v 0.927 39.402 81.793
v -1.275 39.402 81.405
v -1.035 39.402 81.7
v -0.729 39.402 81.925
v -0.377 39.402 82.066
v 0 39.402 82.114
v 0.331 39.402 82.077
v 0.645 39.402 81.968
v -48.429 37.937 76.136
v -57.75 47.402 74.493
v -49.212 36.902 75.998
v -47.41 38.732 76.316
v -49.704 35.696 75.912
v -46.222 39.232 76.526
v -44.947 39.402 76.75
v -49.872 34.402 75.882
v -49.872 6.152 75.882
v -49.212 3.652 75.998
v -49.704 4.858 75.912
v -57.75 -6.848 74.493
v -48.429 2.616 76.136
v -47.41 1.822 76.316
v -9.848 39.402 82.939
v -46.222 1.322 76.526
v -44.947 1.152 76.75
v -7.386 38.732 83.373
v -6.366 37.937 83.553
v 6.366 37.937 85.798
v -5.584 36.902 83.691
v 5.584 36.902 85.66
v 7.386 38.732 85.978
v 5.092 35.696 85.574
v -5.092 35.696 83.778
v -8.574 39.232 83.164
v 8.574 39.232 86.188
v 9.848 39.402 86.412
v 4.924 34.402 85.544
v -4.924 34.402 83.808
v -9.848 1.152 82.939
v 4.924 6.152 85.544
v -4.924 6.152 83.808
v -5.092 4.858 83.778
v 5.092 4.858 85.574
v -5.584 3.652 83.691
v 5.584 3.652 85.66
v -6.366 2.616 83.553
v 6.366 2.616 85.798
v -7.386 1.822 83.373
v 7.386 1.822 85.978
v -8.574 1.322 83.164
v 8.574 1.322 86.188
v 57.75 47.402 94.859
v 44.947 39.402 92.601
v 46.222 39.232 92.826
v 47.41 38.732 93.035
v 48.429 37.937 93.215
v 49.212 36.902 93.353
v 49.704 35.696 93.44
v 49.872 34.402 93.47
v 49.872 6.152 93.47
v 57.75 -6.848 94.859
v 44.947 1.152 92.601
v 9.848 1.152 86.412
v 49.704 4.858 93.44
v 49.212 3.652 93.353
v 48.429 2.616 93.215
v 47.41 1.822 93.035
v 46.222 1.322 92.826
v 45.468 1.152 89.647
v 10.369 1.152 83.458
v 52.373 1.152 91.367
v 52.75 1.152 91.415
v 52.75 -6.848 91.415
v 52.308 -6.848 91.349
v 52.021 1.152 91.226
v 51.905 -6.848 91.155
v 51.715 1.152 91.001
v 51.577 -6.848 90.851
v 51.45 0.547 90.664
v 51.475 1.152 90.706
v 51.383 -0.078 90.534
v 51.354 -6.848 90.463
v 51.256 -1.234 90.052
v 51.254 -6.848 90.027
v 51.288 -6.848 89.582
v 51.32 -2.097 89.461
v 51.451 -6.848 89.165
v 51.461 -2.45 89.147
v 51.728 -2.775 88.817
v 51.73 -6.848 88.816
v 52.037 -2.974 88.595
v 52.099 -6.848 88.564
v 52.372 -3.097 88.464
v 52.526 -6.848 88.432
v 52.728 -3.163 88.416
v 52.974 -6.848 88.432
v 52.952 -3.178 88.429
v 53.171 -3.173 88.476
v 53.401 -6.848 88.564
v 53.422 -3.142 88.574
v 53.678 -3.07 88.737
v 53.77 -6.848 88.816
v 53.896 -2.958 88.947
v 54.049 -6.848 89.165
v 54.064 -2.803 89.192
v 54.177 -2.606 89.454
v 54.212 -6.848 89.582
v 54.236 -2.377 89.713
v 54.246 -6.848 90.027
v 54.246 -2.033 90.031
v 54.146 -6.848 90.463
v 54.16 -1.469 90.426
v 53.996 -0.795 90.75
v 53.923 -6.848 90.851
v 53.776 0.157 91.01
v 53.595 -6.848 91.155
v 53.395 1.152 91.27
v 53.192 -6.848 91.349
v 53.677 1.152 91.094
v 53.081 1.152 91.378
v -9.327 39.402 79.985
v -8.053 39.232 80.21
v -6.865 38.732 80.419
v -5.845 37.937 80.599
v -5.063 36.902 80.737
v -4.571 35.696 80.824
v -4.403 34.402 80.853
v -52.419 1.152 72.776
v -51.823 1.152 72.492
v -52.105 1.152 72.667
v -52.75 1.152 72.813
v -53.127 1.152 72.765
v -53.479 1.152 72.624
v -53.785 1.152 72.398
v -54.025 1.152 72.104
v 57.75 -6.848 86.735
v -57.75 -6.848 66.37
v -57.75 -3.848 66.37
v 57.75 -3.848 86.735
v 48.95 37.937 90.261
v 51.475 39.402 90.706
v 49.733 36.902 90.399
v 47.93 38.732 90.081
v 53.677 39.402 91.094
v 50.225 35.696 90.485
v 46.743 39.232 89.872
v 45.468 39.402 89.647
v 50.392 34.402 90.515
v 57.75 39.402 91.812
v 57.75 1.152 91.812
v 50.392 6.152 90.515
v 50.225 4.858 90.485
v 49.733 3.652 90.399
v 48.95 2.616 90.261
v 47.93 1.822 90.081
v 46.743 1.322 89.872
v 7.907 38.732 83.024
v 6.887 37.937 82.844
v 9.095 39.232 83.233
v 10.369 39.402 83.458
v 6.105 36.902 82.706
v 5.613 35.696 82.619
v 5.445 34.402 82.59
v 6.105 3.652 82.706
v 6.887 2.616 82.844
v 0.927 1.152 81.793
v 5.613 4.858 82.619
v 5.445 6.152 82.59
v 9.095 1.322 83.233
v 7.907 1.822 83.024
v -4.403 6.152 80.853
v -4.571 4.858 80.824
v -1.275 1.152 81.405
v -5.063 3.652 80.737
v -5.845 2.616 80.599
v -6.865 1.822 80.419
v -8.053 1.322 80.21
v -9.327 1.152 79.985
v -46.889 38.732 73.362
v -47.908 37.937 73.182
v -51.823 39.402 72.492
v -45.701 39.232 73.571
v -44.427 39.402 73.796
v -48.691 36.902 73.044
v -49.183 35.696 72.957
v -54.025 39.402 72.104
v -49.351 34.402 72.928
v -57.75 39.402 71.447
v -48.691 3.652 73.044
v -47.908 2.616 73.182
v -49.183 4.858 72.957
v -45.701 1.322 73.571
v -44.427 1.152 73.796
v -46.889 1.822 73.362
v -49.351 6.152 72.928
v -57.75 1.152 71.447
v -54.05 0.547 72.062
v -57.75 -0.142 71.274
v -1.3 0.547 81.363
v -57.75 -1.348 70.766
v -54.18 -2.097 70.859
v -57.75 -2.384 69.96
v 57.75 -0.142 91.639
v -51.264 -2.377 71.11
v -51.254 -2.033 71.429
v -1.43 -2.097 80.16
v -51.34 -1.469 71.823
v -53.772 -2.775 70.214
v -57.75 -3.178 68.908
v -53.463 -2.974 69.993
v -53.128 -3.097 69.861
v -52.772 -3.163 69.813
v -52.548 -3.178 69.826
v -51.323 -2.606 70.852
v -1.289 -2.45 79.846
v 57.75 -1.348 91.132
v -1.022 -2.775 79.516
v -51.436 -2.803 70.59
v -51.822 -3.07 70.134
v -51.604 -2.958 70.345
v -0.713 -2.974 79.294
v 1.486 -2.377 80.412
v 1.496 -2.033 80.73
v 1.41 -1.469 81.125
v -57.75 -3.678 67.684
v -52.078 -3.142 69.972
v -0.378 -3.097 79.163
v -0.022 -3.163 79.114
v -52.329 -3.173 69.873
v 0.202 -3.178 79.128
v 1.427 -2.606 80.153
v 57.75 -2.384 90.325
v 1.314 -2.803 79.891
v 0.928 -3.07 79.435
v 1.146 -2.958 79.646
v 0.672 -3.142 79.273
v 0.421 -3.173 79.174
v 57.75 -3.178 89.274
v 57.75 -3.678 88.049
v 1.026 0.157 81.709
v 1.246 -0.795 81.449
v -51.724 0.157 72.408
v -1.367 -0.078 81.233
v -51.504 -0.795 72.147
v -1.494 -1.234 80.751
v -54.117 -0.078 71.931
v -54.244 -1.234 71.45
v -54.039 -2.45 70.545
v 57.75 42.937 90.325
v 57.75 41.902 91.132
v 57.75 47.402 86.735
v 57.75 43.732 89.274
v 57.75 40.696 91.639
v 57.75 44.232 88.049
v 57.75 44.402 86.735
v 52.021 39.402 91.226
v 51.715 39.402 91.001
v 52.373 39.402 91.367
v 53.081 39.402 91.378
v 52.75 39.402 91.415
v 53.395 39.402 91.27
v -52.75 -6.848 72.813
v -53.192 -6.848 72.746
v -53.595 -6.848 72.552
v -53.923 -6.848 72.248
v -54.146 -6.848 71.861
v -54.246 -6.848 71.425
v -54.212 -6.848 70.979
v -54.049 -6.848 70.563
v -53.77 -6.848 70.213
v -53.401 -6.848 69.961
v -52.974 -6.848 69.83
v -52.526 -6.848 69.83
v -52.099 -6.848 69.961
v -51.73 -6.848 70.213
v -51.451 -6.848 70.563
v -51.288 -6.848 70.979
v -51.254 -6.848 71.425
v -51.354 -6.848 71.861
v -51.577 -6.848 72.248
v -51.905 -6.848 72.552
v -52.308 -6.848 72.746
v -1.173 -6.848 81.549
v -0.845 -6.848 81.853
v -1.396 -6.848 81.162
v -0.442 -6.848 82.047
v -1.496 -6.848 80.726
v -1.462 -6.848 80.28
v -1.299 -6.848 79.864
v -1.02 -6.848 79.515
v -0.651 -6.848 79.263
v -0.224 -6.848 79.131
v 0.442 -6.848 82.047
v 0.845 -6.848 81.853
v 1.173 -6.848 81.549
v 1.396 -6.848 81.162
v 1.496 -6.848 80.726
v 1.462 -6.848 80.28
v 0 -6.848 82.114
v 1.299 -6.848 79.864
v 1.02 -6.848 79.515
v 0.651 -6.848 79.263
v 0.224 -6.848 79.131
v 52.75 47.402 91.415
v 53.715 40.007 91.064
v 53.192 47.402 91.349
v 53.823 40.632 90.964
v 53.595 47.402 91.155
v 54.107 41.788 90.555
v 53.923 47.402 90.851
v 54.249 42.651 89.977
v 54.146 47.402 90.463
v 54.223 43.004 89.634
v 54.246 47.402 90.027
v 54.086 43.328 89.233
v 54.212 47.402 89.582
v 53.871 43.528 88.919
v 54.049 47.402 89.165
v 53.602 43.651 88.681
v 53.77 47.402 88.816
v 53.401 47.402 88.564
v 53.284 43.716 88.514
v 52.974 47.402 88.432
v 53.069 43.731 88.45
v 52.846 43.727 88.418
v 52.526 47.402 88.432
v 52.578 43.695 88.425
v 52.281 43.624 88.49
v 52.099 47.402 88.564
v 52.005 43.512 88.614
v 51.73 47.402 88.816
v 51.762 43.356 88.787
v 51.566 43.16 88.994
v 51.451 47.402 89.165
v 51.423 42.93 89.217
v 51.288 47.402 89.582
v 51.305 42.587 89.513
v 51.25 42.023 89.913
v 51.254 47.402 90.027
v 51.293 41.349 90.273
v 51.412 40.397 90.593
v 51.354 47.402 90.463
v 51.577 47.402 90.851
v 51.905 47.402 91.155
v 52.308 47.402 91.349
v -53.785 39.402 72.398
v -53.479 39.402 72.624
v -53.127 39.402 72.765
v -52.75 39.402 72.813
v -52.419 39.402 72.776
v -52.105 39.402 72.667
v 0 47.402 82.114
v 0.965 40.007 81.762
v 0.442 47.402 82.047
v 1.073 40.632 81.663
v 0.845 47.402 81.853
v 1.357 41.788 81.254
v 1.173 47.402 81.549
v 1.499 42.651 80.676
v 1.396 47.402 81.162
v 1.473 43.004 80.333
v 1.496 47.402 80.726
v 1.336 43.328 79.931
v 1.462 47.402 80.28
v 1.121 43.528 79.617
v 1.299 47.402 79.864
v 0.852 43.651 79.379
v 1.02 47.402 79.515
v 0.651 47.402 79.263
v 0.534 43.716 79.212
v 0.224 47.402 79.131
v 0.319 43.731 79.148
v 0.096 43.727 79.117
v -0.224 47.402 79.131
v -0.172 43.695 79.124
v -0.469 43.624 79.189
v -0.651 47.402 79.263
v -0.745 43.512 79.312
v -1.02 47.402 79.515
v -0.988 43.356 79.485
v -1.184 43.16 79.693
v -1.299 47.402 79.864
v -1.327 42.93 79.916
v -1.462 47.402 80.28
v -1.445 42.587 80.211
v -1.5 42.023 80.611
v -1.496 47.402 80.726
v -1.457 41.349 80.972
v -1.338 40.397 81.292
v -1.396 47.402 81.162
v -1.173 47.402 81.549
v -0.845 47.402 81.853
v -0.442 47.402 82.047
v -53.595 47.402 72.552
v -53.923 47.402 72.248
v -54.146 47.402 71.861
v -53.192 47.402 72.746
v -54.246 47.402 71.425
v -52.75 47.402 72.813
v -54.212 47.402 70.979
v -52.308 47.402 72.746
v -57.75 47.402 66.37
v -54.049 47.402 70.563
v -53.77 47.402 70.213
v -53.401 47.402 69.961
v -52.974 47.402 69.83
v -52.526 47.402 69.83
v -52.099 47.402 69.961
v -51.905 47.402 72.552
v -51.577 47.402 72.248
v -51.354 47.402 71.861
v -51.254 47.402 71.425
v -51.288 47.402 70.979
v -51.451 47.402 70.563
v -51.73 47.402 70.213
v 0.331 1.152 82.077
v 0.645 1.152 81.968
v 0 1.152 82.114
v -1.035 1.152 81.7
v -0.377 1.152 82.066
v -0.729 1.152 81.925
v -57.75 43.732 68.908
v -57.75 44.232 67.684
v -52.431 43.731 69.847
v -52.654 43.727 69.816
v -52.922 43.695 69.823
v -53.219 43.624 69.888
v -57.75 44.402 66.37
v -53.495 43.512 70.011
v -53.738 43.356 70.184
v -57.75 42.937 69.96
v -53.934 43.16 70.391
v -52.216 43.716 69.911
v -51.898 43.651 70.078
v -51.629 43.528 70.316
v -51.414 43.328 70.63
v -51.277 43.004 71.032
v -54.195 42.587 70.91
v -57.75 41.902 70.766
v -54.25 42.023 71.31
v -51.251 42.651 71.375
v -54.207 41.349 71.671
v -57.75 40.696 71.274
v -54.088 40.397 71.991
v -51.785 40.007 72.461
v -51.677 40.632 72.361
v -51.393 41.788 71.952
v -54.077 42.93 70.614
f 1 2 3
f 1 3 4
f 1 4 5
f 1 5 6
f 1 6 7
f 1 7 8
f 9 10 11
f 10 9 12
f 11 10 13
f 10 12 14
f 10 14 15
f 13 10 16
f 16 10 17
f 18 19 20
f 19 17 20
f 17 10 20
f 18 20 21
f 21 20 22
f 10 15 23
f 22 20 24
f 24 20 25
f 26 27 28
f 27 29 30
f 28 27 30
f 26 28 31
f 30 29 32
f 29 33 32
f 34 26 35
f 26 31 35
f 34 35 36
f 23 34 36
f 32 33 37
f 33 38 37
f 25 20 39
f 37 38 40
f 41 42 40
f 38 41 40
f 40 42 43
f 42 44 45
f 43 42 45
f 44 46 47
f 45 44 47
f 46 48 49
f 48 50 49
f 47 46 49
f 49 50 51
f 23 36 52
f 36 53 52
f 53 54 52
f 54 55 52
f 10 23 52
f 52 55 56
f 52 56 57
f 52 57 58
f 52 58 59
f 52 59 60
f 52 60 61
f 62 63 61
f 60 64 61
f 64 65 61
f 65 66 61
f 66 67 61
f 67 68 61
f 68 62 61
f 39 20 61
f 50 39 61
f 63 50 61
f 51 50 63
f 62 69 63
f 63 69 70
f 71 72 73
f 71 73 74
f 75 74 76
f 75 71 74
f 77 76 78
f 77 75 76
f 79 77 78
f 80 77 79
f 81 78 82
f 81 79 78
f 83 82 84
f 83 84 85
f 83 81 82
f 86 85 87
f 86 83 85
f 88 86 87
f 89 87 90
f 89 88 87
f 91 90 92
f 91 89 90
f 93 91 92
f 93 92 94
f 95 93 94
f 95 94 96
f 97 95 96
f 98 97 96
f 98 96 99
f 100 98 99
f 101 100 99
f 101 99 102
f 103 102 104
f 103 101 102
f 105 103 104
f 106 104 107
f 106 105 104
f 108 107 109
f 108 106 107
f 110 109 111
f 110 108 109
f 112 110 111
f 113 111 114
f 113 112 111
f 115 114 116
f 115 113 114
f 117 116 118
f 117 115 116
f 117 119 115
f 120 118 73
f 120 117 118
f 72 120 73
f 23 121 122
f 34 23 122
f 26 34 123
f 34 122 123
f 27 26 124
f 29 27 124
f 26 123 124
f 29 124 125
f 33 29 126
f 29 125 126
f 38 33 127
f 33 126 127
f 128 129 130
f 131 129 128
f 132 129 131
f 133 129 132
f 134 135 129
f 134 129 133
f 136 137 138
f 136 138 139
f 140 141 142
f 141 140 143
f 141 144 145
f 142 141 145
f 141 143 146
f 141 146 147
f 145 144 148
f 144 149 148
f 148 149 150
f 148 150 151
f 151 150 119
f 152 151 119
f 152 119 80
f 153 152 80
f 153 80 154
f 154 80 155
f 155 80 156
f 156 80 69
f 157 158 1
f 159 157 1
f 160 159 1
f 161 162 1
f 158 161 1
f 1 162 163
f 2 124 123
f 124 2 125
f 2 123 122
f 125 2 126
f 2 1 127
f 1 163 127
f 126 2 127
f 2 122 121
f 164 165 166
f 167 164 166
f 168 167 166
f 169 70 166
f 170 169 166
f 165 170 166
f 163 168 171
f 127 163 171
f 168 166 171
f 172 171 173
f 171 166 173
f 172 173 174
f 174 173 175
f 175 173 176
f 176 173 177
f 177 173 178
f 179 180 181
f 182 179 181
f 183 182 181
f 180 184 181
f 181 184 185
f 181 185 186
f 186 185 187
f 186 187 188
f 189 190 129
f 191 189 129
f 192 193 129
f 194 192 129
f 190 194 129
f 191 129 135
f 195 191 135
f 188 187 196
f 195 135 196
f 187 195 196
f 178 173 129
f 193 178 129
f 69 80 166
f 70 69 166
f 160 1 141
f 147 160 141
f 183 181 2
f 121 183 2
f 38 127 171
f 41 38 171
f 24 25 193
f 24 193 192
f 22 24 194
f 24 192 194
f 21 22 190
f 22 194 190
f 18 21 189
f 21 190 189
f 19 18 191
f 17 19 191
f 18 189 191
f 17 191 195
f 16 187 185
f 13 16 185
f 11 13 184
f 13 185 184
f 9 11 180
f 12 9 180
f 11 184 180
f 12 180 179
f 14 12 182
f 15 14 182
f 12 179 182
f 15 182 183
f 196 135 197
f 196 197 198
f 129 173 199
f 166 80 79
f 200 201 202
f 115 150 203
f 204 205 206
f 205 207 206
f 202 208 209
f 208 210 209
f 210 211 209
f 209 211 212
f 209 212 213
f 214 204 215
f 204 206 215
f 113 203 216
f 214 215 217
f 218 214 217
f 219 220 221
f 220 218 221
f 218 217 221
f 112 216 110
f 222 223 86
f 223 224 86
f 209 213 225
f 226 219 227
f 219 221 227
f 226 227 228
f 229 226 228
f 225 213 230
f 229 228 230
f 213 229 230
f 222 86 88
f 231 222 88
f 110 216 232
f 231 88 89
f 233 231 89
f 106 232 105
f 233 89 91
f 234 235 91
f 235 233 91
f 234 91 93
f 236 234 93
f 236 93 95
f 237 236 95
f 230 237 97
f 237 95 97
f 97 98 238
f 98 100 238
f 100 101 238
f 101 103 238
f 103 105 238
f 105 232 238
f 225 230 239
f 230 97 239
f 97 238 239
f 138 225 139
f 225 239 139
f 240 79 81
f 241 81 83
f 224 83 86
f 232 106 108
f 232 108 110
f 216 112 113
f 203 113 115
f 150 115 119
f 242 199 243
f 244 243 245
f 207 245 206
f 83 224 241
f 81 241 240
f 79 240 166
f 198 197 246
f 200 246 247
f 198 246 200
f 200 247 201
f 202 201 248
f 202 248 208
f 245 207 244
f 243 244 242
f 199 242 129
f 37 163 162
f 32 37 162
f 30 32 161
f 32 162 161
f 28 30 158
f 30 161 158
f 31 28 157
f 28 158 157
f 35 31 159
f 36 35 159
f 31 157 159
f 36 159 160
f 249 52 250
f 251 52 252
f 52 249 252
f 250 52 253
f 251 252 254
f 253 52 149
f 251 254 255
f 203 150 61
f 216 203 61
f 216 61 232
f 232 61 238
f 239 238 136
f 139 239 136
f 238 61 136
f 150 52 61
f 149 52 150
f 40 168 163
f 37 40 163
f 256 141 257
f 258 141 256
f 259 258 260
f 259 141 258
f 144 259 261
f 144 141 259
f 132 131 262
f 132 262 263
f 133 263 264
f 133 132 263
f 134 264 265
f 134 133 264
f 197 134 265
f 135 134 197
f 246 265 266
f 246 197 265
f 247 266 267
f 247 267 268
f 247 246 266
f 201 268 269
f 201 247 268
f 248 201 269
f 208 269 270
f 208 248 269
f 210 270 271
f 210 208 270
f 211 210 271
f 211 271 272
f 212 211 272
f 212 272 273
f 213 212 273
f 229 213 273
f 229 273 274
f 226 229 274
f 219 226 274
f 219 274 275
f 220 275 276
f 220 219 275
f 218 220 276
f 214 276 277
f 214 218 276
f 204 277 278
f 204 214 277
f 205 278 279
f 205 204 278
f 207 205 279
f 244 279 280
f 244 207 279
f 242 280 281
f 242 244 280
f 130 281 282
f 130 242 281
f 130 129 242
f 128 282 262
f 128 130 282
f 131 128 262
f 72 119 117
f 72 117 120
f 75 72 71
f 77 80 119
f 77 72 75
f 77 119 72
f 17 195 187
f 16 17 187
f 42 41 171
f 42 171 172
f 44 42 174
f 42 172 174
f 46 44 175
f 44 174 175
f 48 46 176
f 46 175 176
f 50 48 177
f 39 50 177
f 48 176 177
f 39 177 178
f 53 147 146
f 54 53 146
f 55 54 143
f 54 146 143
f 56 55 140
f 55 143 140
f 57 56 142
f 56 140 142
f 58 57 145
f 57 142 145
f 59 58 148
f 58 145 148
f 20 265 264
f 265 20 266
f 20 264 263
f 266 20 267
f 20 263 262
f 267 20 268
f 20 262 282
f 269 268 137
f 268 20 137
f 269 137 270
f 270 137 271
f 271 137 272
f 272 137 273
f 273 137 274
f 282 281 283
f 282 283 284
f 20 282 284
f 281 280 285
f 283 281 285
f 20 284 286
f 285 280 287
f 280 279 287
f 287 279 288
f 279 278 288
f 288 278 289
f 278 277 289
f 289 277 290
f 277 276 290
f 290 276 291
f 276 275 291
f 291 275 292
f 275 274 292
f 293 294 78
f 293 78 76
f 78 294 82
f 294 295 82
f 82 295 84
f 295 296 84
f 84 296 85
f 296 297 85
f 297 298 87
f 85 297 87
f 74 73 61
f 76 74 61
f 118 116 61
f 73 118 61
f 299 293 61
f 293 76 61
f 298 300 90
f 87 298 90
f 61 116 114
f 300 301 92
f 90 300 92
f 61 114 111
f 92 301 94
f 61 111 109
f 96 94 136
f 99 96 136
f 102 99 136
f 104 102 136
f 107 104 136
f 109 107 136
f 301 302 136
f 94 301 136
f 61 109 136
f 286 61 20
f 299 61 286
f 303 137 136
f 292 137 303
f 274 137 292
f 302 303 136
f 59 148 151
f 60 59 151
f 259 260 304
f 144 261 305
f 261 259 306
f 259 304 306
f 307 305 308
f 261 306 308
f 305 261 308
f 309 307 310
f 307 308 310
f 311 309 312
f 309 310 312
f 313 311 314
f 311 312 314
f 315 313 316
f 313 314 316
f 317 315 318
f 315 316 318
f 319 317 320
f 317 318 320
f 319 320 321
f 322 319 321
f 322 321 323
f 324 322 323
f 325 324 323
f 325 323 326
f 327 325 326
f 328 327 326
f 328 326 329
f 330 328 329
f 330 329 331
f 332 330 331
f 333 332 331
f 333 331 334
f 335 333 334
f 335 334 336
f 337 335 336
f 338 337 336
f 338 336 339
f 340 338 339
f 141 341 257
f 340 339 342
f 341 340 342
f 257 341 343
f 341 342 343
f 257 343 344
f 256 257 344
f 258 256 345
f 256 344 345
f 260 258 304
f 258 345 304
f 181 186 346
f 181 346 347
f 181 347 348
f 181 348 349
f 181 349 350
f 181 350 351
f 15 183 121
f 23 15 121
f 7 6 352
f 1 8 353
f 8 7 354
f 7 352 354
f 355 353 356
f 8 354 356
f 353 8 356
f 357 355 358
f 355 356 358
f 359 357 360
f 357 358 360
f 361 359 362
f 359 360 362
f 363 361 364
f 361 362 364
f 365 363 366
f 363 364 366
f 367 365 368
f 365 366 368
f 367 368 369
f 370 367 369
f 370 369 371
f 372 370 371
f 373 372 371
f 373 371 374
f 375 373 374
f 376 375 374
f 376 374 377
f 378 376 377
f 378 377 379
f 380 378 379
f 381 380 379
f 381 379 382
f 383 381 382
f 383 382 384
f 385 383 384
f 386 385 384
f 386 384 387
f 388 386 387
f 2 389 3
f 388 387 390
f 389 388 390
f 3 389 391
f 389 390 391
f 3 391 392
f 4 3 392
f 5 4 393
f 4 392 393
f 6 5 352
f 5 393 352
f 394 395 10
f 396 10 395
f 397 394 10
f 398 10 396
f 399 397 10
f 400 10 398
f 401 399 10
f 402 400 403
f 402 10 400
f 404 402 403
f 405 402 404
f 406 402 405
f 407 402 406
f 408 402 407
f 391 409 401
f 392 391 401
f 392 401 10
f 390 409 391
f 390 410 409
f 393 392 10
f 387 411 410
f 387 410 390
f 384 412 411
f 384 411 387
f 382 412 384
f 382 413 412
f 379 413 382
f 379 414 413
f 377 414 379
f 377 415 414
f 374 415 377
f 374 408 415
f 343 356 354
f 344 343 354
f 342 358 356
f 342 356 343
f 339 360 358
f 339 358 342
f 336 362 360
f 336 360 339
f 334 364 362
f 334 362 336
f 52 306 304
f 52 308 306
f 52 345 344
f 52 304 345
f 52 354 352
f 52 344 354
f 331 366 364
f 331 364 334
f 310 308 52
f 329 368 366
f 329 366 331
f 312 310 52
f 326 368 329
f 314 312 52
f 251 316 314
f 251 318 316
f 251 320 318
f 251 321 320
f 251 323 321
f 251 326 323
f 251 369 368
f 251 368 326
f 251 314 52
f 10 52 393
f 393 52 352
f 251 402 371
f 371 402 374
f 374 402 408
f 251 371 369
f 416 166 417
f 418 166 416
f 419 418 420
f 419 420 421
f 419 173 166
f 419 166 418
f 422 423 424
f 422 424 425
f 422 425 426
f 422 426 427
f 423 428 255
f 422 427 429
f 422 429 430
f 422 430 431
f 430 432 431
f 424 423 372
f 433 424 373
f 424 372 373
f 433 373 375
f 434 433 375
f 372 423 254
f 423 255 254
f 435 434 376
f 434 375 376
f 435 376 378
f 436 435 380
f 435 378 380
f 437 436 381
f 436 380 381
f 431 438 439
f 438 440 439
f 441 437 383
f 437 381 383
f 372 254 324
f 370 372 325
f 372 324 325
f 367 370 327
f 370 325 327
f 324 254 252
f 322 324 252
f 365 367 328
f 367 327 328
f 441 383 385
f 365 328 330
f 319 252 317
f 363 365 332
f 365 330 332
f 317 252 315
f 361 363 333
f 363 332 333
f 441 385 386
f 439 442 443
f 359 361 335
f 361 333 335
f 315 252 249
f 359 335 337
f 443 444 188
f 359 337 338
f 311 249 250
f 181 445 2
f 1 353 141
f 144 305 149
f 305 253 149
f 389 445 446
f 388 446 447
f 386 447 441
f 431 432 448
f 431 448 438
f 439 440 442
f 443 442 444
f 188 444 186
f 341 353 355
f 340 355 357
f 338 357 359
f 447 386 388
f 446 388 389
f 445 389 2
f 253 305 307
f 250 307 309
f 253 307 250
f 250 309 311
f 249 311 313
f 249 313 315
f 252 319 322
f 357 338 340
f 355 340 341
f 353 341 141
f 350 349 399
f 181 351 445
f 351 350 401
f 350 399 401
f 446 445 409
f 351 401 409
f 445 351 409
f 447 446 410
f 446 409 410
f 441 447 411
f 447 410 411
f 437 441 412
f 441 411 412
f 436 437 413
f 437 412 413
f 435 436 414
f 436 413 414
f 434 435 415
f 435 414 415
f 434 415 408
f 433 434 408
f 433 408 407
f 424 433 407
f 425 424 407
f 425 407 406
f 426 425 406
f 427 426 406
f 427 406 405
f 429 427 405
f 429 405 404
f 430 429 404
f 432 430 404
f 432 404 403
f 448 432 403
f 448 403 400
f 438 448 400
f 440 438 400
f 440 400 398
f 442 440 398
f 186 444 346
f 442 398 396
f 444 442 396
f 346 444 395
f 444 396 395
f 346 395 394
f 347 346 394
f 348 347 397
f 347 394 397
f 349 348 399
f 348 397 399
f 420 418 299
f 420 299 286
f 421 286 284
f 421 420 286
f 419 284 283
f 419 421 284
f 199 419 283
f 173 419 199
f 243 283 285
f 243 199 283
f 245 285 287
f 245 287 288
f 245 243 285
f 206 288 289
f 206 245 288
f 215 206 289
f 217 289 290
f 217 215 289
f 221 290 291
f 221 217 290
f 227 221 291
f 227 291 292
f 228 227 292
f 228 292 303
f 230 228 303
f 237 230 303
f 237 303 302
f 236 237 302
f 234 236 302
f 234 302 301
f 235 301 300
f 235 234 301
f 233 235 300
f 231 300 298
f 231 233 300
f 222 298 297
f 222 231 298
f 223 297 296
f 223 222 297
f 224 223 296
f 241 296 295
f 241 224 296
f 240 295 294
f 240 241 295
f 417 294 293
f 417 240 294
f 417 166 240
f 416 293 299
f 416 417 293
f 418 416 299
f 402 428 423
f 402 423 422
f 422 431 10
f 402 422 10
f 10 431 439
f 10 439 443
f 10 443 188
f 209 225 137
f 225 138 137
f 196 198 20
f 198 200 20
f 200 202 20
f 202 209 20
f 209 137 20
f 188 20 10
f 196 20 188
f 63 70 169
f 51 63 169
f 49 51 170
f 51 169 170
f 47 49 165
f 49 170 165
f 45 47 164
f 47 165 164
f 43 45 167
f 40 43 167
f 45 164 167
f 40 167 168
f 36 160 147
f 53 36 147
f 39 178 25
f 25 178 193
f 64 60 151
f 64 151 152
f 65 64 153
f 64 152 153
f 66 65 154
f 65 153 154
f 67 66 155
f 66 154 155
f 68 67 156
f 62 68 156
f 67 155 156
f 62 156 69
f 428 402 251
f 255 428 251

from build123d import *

# Parameters (mm, degrees)
MAIN_BRACKET_EXTRUDE_DEPTH        = 54.25
TOP_SCREWHOLE_EXTENSION_DEPTH     = 3
BOTTOM_SCREWHOLE_EXTENSION_DEPTH  = 3
SCREWHOLE_EXTENSION_FILLETS_5MM_R = 5
SKETCH4_R                         = 1.5
TOP_SCREWHOLES_DEPTH              = 8
BOTTOM_START                      = -8
SKETCH5_R                         = 1.5
BOTTOM_SCREWHOLES_DEPTH           = 8
WEIGHT_REDUCTION_DEPTH            = 88.819886832
WEIGHT_REDUCTION_DEPTH_BACK       = 88.819886832


with BuildPart() as part:
    # Sketch1 → Main bracket extrude (new body)
    with BuildSketch(Plane(origin=(0, -6.84807753, 0), x_dir=(1, 0, 0), z_dir=(0, 1, 0))):
        Polygon((-57.75, -74.492924432), (57.75, -94.858690704), (57.75, -91.812410869), (-57.75, -71.446644597), align=None)
    extrude(amount=MAIN_BRACKET_EXTRUDE_DEPTH)

    # Sketch2 → Top screwhole extension (add)
    with BuildSketch(Plane(origin=(0, 47.40192247, 0), x_dir=(1, 0, 0), z_dir=(0, 1, 0))):
        Polygon((-57.75, -74.492924432), (-57.75, -66.369511537), (57.75, -86.735277809), (57.75, -94.858690704), align=None)
    extrude(amount=-TOP_SCREWHOLE_EXTENSION_DEPTH)

    # Sketch3 → Bottom screwhole extension (add)
    with BuildSketch(Plane.XZ.offset(6.84807753)):
        Polygon((-57.75, 74.492924432), (-57.75, 66.369511537), (57.75, 86.735277809), (57.75, 94.858690704), align=None)
    extrude(amount=-BOTTOM_SCREWHOLE_EXTENSION_DEPTH)

    # Screwhole extension fillets 5mm
    screwhole_extension_fillets_5mm_edges = [part.edges().sort_by_distance(p)[0] for p in [
        (0, 44.40192247, 81.629527733),
        (0, -3.84807753, 81.629527733),
    ]]
    fillet(screwhole_extension_fillets_5mm_edges, radius=SCREWHOLE_EXTENSION_FILLETS_5MM_R - 0.0001)  # a hair under: the kernel refuses the full size

    # Sketch4 → Top screwholes (cut)
    with BuildSketch(Plane(origin=(0, 47.40192247, 0), x_dir=(1, 0, 0), z_dir=(0, 1, 0))):
        with Locations(Location((-52.75, -71.312852888, 0), (0, 0, 270))):
            Circle(SKETCH4_R)
        with Locations(Location((0, -80.614101121, 0), (0, 0, 270))):
            Circle(SKETCH4_R)
        with Locations(Location((52.75, -89.915349353, 0), (0, 0, 270))):
            Circle(SKETCH4_R)
    extrude(amount=-TOP_SCREWHOLES_DEPTH, mode=Mode.SUBTRACT)

    # Sketch5 → Bottom screwholes (cut)
    with BuildSketch(Plane.XZ.offset(6.84807753).offset(BOTTOM_START)):
        with Locations(Location((52.75, 89.915349353, 0), (0, 0, 90))):
            Circle(SKETCH5_R)
        with Locations(Location((0, 80.614101121, 0), (0, 0, 90))):
            Circle(SKETCH5_R)
        with Locations(Location((-52.75, 71.312852888, 0), (0, 0, 90))):
            Circle(SKETCH5_R)
    extrude(amount=BOTTOM_SCREWHOLES_DEPTH, mode=Mode.SUBTRACT)

    # Sketch6 → Weight reduction (cut, two sides: drawn at the far end of the back side and taken through both)
    with BuildSketch(Plane(origin=(-14.48041592, 0, 82.12251955), x_dir=(0.9848077530122094, 0, 0.17364817766692336), z_dir=(-0.17364817766692334, 0, 0.9848077530122092)).offset(-WEIGHT_REDUCTION_DEPTH_BACK)):
        with BuildLine():
            Line((-30.93708716, 39.40192247), (4.703799677, 39.40192247))
            ThreePointArc((4.703799677, 39.40192247), (8.239333583, 37.937456376), (9.703799677, 34.40192247))
            Line((9.703799677, 34.40192247), (9.703799677, 6.15192247))
            ThreePointArc((9.703799677, 6.15192247), (8.239333583, 2.616388564), (4.703799677, 1.15192247))
            Line((4.703799677, 1.15192247), (-30.93708716, 1.15192247))
            ThreePointArc((-30.93708716, 1.15192247), (-34.472621066, 2.616388564), (-35.93708716, 6.15192247))
            Line((-35.93708716, 6.15192247), (-35.93708716, 34.40192247))
            ThreePointArc((-35.93708716, 34.40192247), (-34.472621066, 37.937456376), (-30.93708716, 39.40192247))
        make_face()
        with BuildLine():
            Line((24.703799677, 39.40192247), (60.344686513, 39.40192247))
            ThreePointArc((60.344686513, 39.40192247), (63.880220419, 37.937456376), (65.344686513, 34.40192247))
            Line((65.344686513, 34.40192247), (65.344686513, 6.15192247))
            ThreePointArc((65.344686513, 6.15192247), (63.880220419, 2.616388564), (60.344686513, 1.15192247))
            Line((60.344686513, 1.15192247), (24.703799677, 1.15192247))
            ThreePointArc((24.703799677, 1.15192247), (21.168265771, 2.616388564), (19.703799677, 6.15192247))
            Line((19.703799677, 6.15192247), (19.703799677, 34.40192247))
            ThreePointArc((19.703799677, 34.40192247), (21.168265771, 37.937456376), (24.703799677, 39.40192247))
        make_face()
    extrude(amount=WEIGHT_REDUCTION_DEPTH + WEIGHT_REDUCTION_DEPTH_BACK, mode=Mode.SUBTRACT)


solid = part.part
